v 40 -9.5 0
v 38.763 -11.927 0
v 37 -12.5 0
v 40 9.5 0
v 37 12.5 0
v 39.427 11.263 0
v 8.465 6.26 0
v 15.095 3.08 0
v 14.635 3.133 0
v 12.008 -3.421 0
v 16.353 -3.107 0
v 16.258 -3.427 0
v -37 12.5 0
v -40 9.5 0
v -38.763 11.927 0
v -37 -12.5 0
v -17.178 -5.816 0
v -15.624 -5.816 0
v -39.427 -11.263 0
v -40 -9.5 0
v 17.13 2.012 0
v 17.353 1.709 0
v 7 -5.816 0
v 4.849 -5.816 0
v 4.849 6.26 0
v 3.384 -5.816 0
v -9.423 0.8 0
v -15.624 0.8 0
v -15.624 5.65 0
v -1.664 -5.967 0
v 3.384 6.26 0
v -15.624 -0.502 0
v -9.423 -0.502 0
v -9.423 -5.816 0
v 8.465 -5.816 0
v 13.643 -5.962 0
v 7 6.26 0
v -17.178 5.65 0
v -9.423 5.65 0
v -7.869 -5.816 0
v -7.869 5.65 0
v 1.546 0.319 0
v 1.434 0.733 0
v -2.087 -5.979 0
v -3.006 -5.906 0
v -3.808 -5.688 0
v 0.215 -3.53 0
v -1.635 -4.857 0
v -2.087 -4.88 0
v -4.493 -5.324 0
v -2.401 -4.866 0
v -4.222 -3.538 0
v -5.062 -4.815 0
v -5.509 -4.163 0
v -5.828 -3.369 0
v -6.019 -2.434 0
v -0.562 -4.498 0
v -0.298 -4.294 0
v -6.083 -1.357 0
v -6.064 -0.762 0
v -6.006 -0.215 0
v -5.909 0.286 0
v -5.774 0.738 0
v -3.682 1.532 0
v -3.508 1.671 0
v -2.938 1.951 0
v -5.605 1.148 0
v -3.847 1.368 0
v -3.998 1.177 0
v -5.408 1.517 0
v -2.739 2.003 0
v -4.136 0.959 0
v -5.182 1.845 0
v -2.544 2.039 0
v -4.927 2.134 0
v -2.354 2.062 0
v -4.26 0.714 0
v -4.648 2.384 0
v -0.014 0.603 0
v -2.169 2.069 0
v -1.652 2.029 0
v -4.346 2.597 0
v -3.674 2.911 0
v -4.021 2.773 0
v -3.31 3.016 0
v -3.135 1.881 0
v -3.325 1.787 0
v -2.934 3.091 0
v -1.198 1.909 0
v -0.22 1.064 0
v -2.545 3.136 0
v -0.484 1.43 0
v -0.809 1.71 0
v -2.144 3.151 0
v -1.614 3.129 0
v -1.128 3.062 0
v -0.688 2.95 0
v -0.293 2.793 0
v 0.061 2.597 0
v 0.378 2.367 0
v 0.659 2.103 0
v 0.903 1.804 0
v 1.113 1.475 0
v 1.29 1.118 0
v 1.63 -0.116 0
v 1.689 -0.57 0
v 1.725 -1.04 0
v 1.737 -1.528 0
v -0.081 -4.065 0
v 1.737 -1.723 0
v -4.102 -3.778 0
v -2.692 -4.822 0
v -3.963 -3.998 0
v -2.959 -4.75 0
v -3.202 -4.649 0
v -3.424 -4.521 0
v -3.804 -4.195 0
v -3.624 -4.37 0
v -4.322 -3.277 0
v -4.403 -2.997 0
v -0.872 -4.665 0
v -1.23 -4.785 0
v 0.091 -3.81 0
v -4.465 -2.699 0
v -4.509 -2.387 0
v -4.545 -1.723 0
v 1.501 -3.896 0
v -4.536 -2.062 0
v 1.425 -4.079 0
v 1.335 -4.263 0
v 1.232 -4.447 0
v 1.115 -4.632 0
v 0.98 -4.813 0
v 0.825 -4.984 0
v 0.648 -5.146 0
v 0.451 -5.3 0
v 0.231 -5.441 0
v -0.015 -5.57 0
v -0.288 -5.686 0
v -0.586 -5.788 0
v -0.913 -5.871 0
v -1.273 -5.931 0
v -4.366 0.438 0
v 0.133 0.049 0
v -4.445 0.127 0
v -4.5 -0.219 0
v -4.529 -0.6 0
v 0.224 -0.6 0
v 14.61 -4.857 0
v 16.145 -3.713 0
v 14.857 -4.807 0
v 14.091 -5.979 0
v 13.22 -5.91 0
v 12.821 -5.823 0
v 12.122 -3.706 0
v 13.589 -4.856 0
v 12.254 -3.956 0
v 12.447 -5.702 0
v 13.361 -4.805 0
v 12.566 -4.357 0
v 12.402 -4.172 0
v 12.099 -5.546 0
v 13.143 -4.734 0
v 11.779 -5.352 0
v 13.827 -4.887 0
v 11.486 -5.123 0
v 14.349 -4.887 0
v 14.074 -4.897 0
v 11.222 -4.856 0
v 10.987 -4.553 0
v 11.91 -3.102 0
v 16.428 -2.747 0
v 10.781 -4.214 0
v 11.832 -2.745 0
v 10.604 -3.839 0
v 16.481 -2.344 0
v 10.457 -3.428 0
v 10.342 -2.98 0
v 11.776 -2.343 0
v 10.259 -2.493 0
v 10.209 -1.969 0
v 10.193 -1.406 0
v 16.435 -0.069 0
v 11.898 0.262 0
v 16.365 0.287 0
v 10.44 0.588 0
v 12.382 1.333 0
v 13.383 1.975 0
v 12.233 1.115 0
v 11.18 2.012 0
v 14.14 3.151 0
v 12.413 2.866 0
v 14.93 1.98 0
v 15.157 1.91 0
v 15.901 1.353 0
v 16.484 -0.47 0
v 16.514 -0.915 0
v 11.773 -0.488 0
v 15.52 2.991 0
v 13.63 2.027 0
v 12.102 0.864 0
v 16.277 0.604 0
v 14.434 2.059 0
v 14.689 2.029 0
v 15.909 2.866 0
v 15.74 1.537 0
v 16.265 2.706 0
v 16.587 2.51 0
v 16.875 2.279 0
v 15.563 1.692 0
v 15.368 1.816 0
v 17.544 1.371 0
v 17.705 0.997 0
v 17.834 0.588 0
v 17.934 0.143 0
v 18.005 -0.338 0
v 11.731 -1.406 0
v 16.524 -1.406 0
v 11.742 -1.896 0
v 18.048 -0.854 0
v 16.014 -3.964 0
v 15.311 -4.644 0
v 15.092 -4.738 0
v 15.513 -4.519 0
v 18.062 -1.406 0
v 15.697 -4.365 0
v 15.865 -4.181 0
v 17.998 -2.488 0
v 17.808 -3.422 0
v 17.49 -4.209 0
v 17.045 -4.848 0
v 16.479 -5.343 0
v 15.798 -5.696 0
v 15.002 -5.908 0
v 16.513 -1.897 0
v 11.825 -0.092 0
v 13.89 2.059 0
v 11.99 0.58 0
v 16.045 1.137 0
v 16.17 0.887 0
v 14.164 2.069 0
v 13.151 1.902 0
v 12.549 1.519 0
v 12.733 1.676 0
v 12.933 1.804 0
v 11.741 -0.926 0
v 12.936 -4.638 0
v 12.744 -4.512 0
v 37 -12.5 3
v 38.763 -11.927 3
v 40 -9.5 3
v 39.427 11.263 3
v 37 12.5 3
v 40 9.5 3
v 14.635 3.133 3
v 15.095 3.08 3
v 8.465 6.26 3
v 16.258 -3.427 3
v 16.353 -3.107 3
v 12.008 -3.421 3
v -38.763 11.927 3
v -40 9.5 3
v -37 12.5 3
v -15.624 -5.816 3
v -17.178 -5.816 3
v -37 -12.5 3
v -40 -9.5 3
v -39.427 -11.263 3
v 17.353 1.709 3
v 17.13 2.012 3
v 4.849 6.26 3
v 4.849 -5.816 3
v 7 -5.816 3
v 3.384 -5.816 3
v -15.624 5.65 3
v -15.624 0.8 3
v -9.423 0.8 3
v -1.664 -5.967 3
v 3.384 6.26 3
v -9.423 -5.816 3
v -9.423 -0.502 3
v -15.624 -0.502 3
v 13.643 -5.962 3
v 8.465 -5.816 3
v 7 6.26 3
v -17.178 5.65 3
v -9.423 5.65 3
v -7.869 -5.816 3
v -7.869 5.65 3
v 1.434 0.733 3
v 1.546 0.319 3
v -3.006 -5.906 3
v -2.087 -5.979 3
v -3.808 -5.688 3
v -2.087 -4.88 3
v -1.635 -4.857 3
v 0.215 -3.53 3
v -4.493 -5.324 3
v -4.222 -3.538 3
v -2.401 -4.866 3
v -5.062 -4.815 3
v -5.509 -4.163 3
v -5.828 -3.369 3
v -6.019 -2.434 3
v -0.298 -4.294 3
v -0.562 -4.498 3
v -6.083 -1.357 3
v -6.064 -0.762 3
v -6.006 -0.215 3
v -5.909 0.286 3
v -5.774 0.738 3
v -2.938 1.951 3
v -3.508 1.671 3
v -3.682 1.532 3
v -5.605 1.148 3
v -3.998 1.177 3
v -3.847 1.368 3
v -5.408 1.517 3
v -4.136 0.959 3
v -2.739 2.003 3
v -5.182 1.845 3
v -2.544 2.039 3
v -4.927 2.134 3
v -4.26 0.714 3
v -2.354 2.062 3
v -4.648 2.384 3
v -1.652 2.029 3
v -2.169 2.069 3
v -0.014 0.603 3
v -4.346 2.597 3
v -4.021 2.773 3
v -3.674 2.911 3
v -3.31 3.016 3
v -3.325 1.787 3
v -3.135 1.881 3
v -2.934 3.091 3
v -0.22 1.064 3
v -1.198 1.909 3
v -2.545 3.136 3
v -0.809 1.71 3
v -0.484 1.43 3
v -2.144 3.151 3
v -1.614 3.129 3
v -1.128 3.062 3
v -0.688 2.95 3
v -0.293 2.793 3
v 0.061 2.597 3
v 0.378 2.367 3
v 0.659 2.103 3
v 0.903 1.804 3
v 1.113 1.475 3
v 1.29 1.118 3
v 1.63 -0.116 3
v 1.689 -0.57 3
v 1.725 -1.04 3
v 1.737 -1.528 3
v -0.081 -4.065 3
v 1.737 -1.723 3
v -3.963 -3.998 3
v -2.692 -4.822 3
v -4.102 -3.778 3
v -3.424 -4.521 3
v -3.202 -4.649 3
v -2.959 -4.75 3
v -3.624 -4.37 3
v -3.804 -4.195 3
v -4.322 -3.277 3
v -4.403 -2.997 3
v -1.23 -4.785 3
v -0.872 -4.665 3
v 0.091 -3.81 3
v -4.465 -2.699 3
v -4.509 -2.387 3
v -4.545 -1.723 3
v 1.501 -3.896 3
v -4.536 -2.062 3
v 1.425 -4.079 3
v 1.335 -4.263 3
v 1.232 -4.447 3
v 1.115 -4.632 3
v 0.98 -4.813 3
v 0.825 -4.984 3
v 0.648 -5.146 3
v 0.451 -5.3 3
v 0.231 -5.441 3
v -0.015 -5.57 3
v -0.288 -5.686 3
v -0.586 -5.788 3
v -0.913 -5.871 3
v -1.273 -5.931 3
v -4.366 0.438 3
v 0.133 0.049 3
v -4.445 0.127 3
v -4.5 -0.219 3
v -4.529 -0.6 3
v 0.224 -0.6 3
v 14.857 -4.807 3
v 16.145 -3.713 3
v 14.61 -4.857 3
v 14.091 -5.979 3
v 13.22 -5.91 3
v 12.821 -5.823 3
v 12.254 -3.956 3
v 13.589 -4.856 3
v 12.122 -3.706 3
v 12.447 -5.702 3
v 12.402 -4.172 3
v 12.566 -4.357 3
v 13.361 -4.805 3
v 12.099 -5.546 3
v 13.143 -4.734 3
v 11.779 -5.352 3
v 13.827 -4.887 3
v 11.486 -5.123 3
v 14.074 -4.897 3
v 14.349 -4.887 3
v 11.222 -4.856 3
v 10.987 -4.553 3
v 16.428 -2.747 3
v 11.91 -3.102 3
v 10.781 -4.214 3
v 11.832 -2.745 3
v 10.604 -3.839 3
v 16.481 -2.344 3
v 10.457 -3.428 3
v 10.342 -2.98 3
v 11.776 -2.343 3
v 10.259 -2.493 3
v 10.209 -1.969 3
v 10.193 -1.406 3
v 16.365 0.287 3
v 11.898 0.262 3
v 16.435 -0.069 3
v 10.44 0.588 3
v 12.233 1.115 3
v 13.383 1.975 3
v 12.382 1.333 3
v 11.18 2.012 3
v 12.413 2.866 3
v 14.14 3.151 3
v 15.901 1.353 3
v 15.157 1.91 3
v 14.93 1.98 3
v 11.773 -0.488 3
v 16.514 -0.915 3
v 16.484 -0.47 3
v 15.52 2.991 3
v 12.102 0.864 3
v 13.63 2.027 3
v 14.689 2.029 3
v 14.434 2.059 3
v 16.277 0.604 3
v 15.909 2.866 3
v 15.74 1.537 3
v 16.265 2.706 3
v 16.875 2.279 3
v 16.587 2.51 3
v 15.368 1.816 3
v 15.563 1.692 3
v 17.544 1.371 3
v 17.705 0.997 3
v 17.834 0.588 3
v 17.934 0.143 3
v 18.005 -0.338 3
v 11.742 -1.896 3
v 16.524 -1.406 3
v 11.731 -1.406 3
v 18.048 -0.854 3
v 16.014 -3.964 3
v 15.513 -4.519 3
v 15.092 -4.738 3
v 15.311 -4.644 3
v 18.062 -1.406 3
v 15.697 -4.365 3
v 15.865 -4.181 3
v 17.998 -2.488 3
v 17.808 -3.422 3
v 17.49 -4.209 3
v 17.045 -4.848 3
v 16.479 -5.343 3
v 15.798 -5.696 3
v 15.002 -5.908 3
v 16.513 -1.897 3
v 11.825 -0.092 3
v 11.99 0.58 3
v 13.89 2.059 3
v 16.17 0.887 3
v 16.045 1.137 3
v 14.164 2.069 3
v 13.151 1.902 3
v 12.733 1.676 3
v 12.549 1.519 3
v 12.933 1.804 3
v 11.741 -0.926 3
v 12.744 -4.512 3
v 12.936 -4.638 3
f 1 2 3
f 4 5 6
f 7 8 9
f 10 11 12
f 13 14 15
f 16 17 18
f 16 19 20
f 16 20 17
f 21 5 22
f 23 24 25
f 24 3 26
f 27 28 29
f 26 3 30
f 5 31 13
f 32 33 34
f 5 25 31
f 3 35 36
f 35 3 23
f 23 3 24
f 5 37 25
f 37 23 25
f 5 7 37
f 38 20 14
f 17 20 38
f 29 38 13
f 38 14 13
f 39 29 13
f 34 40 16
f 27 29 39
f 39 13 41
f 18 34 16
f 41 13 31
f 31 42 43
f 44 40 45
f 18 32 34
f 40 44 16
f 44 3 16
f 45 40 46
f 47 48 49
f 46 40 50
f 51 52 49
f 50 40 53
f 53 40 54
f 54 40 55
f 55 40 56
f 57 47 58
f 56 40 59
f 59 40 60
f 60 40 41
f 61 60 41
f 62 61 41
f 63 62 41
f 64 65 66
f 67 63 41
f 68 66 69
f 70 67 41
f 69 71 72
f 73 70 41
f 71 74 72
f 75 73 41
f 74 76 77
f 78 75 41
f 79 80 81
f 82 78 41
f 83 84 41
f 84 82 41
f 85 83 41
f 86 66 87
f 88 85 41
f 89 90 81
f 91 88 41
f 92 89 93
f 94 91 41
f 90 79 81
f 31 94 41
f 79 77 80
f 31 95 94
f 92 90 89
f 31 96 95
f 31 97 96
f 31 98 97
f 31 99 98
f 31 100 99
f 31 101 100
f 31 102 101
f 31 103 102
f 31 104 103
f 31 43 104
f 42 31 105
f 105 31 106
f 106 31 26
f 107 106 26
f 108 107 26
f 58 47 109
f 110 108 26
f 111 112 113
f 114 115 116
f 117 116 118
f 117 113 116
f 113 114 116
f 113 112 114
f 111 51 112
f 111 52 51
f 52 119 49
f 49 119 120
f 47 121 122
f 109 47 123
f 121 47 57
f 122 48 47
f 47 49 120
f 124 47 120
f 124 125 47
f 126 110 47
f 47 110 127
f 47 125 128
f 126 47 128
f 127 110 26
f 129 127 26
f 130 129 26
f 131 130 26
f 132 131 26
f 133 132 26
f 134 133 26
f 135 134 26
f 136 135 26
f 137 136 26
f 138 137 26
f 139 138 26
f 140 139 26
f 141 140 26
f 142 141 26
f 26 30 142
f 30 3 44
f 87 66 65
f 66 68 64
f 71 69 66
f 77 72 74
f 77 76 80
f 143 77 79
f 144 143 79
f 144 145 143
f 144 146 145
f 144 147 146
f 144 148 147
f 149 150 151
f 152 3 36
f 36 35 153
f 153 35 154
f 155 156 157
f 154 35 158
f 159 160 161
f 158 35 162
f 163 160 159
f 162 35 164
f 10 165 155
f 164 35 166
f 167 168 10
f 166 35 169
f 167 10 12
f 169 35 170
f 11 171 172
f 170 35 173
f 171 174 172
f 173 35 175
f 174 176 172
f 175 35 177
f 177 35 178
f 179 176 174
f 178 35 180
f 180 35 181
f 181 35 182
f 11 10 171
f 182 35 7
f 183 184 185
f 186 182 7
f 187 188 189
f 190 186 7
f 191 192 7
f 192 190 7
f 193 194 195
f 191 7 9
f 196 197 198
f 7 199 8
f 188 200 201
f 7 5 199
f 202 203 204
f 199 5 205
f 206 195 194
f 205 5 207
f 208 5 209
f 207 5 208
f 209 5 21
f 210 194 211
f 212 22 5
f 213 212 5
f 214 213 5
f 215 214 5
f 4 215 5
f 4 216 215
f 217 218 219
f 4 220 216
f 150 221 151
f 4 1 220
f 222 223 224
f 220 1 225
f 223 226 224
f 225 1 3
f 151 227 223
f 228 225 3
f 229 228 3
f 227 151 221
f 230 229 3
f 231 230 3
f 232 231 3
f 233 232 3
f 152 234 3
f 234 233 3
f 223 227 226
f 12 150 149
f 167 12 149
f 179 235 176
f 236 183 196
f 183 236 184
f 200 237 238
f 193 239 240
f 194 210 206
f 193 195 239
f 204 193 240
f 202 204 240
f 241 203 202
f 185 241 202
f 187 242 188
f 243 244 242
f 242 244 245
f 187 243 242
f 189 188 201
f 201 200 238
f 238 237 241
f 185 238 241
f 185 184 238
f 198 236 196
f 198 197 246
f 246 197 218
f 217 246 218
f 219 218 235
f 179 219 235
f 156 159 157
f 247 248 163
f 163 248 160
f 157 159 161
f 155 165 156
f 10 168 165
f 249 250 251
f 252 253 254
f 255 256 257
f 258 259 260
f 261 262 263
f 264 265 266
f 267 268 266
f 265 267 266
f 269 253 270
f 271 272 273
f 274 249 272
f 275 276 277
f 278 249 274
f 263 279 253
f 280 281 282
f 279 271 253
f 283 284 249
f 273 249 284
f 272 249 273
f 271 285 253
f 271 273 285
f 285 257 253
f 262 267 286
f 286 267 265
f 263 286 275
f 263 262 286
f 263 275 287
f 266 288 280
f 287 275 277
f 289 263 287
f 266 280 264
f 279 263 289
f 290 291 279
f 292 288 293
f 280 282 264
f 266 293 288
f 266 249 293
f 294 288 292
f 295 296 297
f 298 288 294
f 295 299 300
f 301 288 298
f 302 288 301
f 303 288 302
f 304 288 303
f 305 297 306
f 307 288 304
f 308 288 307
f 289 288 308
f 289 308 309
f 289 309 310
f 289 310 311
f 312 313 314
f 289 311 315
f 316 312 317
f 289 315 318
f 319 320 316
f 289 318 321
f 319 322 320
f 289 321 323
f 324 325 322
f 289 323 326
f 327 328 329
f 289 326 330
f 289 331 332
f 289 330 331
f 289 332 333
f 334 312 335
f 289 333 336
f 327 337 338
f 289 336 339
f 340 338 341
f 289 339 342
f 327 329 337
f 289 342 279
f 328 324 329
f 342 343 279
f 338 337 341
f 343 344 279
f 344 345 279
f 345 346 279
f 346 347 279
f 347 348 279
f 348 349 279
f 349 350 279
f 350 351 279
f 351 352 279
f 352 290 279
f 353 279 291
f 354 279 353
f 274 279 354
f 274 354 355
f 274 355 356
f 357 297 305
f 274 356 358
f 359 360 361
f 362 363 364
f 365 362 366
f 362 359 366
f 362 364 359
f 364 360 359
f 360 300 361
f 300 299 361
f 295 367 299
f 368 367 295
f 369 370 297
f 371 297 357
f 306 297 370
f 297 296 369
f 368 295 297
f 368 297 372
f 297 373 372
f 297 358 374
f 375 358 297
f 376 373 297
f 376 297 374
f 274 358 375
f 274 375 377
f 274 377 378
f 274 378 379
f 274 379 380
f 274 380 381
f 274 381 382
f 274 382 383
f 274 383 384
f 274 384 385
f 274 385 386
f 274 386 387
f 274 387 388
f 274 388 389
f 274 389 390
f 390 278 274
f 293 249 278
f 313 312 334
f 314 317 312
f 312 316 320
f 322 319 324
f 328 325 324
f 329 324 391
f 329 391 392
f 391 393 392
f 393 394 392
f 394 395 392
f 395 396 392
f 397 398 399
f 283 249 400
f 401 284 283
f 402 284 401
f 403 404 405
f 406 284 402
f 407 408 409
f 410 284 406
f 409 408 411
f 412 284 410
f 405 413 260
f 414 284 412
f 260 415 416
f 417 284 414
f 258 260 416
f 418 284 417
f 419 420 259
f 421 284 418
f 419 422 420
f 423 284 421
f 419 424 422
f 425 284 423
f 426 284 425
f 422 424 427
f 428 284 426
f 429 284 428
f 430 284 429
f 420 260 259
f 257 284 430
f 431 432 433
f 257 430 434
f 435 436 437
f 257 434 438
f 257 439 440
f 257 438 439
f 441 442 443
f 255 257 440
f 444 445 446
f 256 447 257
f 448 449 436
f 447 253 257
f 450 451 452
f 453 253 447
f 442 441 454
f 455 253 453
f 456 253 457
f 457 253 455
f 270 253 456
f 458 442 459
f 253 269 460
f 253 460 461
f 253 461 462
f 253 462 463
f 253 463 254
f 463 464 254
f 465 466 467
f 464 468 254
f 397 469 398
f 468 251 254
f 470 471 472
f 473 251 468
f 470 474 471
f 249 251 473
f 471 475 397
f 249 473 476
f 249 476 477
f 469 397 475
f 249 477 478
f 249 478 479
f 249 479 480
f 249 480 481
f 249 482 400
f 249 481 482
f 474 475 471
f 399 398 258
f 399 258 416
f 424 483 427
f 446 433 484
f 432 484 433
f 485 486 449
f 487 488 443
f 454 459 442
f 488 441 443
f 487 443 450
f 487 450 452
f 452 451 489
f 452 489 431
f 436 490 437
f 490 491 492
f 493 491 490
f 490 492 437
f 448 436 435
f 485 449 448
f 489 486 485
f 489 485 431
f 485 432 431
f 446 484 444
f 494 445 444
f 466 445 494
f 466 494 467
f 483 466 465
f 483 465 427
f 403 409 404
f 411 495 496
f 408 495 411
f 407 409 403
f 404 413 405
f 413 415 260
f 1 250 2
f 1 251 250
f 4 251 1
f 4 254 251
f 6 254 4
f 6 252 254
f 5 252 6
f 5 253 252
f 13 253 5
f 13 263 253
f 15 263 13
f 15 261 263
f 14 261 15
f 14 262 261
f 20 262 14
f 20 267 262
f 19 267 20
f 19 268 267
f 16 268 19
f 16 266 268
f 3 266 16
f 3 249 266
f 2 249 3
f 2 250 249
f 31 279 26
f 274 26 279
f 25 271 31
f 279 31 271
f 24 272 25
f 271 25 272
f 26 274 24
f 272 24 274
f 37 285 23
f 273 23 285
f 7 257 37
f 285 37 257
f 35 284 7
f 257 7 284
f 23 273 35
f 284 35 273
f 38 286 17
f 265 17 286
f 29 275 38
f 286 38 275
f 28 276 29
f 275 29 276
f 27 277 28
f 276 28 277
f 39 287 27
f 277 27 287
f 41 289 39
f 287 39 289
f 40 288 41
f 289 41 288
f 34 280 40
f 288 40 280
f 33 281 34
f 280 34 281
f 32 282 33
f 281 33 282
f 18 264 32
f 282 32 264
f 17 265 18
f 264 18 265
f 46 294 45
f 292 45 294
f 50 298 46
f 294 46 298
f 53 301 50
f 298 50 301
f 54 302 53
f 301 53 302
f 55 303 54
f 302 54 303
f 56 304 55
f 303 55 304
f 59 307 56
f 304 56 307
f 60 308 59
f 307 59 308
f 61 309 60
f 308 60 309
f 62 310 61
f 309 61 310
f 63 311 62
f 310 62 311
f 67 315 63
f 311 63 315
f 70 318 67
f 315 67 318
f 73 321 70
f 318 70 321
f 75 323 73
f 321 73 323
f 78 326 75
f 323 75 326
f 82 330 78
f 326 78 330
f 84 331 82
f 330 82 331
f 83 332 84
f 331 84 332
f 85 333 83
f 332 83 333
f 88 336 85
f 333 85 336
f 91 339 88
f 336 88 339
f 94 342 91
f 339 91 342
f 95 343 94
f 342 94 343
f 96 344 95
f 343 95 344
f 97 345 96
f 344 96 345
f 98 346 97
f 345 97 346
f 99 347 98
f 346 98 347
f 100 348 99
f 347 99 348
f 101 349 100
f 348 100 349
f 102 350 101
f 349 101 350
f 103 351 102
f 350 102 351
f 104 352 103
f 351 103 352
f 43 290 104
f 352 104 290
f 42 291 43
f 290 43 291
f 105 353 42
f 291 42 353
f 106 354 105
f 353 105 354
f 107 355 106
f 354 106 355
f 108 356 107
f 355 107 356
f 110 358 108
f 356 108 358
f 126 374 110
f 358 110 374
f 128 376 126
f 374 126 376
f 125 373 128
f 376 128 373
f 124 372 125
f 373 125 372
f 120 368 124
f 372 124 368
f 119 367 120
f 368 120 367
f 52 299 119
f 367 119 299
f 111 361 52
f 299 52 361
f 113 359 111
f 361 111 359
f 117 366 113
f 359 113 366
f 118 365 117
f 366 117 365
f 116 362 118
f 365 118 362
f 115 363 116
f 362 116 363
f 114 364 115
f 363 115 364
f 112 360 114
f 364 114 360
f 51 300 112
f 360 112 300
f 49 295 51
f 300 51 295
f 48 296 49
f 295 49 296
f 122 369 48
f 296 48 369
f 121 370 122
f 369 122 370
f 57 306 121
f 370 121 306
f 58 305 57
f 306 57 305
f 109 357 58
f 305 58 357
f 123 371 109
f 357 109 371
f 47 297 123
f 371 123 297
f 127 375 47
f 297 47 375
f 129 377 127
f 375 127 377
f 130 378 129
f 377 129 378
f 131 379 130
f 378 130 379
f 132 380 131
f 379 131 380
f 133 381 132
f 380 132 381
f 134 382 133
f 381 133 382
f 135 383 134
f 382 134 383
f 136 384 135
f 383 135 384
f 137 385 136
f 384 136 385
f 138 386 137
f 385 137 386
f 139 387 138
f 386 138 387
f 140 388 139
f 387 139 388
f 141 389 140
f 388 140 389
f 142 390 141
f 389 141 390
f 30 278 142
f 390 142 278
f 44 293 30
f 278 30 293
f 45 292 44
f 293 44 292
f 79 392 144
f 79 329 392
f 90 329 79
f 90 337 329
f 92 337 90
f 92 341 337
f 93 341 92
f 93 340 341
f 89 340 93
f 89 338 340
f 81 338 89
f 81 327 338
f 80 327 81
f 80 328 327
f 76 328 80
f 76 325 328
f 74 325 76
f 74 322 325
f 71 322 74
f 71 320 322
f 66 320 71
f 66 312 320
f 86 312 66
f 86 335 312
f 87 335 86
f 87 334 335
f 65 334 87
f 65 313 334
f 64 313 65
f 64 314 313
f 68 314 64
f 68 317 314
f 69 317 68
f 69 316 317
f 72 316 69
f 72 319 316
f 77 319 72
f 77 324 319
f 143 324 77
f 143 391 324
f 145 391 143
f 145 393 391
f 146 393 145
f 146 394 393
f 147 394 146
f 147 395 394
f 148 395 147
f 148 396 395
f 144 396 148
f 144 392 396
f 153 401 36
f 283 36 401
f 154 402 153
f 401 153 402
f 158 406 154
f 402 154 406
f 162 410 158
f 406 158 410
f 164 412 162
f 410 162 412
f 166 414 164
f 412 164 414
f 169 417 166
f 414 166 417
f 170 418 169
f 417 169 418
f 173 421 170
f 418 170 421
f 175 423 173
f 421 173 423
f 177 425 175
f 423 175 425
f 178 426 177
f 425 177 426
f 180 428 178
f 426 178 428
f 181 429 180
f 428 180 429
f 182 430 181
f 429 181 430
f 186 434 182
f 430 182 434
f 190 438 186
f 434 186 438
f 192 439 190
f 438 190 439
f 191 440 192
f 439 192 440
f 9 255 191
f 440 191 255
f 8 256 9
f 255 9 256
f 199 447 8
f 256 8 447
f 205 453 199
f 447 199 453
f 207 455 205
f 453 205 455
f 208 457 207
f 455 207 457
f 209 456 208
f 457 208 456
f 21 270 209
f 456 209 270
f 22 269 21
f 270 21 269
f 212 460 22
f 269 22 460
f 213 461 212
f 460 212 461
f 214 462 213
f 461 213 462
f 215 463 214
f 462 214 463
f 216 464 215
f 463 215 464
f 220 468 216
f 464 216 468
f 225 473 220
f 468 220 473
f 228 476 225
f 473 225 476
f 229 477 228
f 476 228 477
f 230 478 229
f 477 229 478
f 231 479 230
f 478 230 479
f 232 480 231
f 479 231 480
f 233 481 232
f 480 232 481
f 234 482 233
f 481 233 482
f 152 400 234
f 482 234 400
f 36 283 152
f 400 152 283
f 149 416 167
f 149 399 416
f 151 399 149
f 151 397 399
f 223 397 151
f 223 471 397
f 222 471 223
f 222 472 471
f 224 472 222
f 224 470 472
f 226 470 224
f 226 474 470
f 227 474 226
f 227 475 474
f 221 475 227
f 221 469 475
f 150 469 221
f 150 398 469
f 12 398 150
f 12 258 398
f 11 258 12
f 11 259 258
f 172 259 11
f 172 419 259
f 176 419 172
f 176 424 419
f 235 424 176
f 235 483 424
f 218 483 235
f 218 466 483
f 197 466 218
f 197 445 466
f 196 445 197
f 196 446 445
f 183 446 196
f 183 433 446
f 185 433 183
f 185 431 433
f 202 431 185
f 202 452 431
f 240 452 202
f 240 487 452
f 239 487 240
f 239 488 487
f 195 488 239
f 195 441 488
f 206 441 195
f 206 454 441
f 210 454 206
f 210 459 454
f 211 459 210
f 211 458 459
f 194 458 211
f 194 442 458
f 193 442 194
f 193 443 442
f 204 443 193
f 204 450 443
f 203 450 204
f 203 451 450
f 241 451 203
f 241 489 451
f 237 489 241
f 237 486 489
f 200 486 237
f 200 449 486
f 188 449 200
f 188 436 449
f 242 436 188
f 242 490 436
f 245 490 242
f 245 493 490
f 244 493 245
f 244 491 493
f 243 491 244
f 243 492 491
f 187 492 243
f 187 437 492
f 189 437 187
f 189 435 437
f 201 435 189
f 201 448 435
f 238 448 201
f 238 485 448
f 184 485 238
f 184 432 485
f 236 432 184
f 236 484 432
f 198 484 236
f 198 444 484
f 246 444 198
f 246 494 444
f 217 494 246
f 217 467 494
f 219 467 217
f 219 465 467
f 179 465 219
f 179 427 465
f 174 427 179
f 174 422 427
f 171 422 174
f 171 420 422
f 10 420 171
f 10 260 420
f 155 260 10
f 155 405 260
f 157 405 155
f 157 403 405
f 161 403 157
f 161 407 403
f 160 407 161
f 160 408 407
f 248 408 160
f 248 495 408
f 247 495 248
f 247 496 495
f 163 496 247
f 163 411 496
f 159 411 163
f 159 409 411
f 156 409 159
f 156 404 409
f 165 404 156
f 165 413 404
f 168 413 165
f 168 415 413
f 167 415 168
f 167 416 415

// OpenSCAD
// Generic 2D Project — Parametric Nameplate
// A community-style project that produces both 2D and 3D output,
// using non-keyguard parameter names. Tests generic render-intent
// resolution (Phase 1 parity harness).

/* [Nameplate] */
plate_width = 80; // [30:200]
plate_height = 25; // [15:80]
text_content = "Hello";
font_size = 12; // [6:36]

/* [Output] */
// This enum uses a generic name ("output_mode"), NOT "generate".
output_mode = "3d"; // [3d, 2d_engrave, 2d_cut]
border_style = "rounded"; // [square, rounded, chamfered]
corner_radius = 3; // [0:10]

/* [Decoration] */
// import the companion SVG as a surface decoration
use_pattern = "no"; // [yes, no]
pattern_file = "pattern.svg";

module nameplate_2d() {
    difference() {
        if (border_style == "rounded") {
            offset(r = corner_radius)
                offset(delta = -corner_radius)
                    square([plate_width, plate_height], center = true);
        } else if (border_style == "chamfered") {
            offset(delta = -corner_radius)
                offset(chamfer = corner_radius)
                    square([plate_width, plate_height], center = true);
        } else {
            square([plate_width, plate_height], center = true);
        }

        text(text_content, size = font_size, halign = "center", valign = "center");
    }
}

module nameplate_3d() {
    linear_extrude(height = 3)
        nameplate_2d();
}

if (output_mode == "3d") {
    nameplate_3d();
} else {
    nameplate_2d();
}
